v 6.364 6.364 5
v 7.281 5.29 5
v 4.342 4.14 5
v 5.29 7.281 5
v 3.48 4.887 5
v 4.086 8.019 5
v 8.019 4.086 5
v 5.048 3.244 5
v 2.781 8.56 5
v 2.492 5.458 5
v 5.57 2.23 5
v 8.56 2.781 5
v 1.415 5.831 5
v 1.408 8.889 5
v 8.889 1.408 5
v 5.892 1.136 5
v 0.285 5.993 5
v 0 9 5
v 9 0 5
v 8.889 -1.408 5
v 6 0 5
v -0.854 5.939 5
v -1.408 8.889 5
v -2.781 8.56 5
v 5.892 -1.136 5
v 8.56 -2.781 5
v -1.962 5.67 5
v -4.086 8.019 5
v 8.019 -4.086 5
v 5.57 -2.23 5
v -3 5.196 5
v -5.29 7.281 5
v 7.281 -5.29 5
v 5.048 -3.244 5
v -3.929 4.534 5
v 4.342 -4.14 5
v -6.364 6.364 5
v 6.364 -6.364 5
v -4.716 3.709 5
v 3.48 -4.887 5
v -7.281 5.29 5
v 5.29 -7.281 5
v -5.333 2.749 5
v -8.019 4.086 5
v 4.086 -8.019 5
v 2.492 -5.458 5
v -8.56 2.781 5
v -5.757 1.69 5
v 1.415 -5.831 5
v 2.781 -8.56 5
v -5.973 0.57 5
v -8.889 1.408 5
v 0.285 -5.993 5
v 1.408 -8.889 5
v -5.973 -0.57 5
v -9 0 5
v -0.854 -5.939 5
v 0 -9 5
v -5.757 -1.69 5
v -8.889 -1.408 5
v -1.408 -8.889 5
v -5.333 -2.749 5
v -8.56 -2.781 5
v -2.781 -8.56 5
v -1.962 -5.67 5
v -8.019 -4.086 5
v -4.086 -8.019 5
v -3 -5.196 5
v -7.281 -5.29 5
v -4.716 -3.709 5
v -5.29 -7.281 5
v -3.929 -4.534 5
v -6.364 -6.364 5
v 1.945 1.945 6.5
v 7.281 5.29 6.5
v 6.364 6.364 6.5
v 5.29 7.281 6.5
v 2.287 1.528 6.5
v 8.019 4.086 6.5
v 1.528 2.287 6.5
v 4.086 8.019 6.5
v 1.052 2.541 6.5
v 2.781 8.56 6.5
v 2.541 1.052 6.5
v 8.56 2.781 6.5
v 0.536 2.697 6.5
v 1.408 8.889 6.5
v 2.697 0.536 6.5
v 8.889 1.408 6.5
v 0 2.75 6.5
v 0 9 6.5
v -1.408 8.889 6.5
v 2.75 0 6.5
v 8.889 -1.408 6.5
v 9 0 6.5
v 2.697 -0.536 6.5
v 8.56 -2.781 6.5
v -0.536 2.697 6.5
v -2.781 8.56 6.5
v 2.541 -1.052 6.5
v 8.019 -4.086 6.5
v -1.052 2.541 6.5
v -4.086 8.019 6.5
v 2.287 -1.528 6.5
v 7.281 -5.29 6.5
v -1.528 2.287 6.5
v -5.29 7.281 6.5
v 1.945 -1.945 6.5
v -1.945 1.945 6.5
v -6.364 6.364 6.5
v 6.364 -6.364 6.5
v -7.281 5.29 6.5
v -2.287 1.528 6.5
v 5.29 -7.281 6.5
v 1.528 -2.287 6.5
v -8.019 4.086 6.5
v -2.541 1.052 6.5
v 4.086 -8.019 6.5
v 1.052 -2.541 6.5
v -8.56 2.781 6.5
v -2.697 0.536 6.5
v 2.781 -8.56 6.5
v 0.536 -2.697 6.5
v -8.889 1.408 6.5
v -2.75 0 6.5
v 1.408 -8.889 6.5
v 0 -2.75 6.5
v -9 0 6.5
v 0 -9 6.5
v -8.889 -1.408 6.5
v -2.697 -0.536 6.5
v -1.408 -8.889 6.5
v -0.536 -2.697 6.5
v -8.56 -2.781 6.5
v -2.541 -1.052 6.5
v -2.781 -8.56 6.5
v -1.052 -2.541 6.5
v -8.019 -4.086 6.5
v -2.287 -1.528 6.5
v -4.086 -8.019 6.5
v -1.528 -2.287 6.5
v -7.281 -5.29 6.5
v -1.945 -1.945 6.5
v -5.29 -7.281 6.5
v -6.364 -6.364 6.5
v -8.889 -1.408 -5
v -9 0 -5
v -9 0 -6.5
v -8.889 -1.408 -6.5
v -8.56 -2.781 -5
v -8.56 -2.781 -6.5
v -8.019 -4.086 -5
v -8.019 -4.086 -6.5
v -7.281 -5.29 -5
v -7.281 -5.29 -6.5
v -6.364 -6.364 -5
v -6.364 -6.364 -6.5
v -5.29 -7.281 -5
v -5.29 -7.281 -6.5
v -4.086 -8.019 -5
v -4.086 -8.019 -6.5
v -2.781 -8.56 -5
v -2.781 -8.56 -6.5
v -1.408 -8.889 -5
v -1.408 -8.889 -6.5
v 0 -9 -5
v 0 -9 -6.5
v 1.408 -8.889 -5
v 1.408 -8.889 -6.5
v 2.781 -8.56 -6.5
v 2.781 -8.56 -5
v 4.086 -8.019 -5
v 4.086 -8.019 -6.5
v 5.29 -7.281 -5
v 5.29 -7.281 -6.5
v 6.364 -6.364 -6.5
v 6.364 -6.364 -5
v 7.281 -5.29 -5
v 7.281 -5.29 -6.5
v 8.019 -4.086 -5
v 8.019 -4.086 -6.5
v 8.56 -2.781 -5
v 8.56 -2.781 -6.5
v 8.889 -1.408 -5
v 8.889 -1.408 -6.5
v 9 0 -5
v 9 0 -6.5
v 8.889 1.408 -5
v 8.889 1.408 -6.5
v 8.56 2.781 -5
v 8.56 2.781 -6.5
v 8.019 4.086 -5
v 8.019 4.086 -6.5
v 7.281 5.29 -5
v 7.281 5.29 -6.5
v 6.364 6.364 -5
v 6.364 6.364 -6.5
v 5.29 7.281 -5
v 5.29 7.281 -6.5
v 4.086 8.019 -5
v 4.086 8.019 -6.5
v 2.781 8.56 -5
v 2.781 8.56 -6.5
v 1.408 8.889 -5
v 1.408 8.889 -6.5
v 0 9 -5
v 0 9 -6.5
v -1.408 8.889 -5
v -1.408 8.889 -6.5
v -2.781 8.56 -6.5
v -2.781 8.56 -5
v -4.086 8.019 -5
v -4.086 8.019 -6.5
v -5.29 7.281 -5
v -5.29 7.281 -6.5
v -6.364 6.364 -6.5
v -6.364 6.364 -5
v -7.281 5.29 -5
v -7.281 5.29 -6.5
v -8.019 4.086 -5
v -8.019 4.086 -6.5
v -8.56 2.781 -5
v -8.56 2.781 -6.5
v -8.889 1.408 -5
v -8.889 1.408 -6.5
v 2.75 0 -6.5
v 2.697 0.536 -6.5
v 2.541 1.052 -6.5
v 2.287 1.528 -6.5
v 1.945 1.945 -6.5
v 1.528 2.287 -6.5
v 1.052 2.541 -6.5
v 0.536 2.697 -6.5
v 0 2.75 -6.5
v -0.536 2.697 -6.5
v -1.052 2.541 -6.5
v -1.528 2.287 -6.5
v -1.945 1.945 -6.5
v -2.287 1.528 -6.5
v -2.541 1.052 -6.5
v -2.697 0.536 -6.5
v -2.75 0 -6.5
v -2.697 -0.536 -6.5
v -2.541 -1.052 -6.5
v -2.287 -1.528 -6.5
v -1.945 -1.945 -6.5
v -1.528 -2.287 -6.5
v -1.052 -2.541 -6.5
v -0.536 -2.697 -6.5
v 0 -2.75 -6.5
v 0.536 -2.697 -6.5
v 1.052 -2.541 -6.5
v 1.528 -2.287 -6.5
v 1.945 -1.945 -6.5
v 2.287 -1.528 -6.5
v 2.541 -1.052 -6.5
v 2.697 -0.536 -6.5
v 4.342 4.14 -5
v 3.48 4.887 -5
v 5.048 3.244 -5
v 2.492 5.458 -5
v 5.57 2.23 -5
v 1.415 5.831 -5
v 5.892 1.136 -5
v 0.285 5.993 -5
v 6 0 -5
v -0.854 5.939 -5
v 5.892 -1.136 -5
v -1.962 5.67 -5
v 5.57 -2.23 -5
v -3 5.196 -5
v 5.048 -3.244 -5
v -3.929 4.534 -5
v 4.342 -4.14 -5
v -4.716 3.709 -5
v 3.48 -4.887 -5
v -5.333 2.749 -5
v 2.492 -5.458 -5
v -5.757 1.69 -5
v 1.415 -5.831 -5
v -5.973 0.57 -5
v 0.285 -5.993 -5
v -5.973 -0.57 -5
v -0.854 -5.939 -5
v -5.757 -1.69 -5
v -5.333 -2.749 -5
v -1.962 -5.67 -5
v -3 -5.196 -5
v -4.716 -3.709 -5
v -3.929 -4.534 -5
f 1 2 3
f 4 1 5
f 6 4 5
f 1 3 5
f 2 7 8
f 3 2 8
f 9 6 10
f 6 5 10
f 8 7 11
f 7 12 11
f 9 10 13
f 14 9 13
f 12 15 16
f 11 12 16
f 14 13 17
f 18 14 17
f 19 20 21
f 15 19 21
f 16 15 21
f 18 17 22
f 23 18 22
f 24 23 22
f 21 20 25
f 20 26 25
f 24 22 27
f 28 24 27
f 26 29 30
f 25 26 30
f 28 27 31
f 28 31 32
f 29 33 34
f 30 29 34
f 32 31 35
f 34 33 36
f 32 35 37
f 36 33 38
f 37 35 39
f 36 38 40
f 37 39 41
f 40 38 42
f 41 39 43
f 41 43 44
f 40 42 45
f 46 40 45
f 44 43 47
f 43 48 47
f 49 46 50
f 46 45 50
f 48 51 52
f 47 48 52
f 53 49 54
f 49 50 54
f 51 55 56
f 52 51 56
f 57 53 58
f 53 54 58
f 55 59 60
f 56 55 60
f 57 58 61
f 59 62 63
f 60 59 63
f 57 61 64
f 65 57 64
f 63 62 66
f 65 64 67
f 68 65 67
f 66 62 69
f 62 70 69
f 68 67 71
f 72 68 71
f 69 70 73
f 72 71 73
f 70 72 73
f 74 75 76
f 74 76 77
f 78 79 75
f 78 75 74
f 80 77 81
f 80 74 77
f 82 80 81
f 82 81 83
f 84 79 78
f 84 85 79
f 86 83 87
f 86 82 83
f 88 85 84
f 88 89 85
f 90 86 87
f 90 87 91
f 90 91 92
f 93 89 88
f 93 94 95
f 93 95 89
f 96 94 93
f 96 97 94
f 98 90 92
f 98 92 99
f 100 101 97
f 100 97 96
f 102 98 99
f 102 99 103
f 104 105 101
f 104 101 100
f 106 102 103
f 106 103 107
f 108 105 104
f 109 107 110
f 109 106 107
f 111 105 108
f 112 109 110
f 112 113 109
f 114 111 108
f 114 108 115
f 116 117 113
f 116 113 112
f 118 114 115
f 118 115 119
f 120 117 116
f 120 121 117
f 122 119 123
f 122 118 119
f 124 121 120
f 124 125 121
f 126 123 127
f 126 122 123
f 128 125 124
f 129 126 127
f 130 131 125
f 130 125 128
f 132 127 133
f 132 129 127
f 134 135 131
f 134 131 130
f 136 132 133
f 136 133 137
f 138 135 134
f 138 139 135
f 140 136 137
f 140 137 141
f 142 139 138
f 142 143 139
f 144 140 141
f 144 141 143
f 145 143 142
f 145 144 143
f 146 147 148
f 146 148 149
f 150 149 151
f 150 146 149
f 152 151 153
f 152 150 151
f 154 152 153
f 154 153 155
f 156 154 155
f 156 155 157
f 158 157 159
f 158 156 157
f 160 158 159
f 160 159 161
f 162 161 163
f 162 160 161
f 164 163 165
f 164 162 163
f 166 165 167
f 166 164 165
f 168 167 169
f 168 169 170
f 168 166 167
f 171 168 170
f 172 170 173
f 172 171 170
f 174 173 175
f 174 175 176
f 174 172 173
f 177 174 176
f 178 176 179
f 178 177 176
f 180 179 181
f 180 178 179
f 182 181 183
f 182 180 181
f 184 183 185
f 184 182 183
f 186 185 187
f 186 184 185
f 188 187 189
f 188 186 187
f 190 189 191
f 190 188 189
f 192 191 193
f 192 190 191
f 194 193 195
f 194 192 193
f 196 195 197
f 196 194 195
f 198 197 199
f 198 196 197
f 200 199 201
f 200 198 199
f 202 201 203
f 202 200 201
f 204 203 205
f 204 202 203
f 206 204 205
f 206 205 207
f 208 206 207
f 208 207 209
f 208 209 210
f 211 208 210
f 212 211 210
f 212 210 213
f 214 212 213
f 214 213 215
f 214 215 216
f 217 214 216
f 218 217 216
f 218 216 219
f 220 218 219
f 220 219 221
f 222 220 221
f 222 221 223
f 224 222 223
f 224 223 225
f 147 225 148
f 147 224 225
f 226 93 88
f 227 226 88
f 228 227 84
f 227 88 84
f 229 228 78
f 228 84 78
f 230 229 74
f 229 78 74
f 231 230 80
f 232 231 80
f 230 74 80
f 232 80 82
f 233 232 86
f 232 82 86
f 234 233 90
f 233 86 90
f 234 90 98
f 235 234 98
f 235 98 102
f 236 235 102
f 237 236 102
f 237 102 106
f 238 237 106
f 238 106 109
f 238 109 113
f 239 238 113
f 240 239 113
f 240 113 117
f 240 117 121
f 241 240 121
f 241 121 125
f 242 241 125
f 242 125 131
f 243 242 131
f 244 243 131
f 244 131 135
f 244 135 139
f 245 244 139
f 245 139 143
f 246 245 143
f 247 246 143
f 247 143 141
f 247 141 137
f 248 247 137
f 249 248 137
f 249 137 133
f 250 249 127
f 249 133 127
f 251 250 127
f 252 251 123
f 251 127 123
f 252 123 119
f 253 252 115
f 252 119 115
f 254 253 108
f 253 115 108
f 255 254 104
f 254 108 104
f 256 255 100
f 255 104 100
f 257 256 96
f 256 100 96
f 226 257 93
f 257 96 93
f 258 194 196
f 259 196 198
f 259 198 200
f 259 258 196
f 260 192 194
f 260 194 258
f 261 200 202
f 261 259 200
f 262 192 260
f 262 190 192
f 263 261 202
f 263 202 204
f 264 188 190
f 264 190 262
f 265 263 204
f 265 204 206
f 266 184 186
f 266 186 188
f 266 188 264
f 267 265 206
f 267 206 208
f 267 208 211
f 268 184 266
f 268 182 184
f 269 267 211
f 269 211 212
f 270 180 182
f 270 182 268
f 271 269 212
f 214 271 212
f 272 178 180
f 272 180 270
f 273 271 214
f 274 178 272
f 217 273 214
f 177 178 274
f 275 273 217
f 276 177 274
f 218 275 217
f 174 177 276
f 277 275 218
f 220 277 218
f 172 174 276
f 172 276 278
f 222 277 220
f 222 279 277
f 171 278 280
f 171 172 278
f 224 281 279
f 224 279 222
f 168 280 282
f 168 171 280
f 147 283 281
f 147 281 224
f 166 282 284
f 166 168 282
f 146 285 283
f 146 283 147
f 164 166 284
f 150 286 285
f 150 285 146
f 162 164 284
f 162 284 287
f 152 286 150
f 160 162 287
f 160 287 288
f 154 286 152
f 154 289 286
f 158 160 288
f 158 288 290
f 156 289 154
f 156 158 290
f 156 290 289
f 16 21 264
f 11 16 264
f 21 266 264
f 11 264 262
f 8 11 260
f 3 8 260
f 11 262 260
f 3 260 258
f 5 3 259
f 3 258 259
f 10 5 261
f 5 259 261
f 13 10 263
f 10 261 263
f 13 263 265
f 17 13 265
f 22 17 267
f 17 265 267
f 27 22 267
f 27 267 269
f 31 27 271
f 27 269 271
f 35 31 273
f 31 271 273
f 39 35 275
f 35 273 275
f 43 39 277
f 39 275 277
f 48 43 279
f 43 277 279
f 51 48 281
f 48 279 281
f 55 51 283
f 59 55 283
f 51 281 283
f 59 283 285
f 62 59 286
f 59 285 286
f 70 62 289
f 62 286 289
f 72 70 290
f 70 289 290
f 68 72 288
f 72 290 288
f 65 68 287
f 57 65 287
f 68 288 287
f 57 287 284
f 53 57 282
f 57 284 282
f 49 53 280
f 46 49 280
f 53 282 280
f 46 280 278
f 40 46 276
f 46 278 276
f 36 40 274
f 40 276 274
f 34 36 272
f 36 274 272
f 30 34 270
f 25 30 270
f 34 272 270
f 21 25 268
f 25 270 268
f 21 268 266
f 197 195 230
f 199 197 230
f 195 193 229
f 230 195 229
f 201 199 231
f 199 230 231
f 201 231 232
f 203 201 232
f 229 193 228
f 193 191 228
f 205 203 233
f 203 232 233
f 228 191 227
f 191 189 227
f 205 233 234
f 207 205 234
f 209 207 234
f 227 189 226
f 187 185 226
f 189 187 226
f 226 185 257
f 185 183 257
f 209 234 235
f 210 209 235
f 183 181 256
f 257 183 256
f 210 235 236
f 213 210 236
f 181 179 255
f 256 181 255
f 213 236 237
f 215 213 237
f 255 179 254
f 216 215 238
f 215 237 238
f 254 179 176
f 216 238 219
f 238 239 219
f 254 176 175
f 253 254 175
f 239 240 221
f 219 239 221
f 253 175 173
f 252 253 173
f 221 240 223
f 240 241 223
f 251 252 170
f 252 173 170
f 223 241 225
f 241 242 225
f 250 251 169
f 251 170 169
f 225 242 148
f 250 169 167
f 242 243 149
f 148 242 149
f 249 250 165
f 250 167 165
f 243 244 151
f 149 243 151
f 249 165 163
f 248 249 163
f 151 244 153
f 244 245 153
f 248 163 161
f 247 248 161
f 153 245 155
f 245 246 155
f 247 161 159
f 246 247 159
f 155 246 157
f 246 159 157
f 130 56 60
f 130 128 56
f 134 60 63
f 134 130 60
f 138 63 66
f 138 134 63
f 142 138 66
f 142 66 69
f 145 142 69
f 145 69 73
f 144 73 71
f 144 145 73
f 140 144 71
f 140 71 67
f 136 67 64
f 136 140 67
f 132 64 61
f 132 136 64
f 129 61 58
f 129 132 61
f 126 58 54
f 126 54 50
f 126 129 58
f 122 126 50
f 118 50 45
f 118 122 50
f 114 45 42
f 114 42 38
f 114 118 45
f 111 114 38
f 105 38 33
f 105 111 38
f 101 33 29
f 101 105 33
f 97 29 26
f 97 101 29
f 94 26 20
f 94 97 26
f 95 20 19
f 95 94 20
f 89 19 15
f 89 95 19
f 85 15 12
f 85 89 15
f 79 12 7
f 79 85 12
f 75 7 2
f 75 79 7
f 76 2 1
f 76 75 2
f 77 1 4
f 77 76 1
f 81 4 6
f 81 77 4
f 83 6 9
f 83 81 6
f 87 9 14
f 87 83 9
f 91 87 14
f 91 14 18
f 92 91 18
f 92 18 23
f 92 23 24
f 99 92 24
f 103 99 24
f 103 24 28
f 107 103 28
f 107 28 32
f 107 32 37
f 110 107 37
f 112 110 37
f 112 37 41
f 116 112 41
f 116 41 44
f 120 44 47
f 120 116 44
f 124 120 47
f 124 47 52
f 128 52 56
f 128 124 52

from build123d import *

# Parameters (mm, degrees)
SKETCH1_R           = 9
BOSS_EXTRUDE1_DEPTH = 6.5
SKETCH2_R           = 9
SKETCH2_R_2         = 6
CUT_EXTRUDE2_DEPTH  = 5
SKETCH3_R           = 2.75
CUT_EXTRUDE3_DEPTH  = 19.193405399


with BuildPart() as part:
    # Sketch1 → Boss-Extrude1 (new, symmetric)
    with BuildSketch(Plane.XY):
        with Locations(Location((0, 0, 0), (0, 0, 180))):
            Circle(SKETCH1_R)
    extrude(amount=BOSS_EXTRUDE1_DEPTH, both=True)

    # Sketch2 → Cut-Extrude2 (cut, symmetric)
    with BuildSketch(Plane.XY):
        with Locations(Location((0, 0, 0), (0, 0, 180))):
            Circle(SKETCH2_R)
        Circle(SKETCH2_R_2, mode=Mode.SUBTRACT)
    extrude(amount=CUT_EXTRUDE2_DEPTH, both=True, mode=Mode.SUBTRACT)

    # Sketch3 → Cut-Extrude3 (cut, through all)
    with BuildSketch(Plane.XY.offset(6.5)):
        Circle(SKETCH3_R)
    extrude(amount=-CUT_EXTRUDE3_DEPTH, mode=Mode.SUBTRACT)


solid = part.part
